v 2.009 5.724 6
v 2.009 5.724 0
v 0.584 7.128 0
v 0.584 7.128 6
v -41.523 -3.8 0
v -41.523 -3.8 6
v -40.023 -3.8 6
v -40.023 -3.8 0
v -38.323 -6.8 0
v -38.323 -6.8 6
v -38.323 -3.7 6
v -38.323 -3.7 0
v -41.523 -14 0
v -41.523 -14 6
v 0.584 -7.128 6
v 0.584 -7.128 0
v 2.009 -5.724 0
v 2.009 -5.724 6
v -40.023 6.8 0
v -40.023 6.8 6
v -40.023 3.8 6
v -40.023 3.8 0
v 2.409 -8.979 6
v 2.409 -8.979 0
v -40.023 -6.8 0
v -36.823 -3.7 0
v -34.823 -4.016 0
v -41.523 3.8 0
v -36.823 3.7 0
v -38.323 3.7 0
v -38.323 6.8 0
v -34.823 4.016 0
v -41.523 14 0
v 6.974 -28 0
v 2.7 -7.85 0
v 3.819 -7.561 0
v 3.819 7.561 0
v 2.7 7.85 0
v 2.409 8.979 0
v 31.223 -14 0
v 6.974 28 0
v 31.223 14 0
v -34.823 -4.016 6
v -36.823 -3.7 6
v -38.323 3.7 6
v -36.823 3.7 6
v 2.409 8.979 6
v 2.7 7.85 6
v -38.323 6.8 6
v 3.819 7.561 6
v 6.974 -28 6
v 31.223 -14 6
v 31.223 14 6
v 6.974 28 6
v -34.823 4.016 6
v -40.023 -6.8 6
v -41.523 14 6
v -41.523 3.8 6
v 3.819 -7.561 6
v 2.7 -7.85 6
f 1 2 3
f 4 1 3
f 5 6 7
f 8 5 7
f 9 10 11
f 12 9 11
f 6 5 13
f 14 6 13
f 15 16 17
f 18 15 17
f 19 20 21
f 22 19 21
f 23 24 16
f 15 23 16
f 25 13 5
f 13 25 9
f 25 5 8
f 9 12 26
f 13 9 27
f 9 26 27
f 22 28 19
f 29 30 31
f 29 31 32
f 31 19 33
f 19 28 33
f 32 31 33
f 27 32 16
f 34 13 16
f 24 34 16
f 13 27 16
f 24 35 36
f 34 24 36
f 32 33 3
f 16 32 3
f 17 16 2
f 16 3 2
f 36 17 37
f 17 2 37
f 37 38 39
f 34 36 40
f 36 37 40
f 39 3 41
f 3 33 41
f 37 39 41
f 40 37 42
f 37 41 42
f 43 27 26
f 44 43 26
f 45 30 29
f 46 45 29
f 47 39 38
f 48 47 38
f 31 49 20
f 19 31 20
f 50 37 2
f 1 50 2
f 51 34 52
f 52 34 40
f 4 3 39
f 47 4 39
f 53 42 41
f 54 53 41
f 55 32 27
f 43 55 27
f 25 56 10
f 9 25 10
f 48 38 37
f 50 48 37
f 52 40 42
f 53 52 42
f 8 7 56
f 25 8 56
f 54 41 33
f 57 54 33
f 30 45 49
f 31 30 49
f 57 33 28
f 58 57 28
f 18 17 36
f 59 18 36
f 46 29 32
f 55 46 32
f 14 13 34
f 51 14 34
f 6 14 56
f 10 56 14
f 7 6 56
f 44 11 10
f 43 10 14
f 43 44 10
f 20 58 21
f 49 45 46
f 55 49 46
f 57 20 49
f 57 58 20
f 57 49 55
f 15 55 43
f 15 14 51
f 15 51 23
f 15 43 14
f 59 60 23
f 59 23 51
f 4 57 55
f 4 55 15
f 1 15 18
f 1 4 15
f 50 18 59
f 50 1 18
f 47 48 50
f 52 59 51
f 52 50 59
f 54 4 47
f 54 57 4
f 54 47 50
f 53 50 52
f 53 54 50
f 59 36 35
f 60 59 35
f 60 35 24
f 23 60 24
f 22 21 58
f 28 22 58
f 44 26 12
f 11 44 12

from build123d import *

# Parameters (mm, degrees)
BOSS_EXTRUDE1_DEPTH = 6
CUT_EXTRUDE1_DEPTH  = 51.439717383


with BuildPart() as part:
    # Sketch1 → Boss-Extrude1 (new body)
    # profile 1 of 2: a face of its own
    with BuildSketch(Plane.XY):
        Polygon((31.223066959, -14), (31.223066959, 0), (-34.823066959, 0), (-34.823066959, -4.01574156), (-36.823066959, -3.7), (-41.523066959, -3.7), (-41.523066959, -14), (6.974355653, -28), align=None)
        Polygon((2.700425446, -7.850425446), (2.408714576, -8.979109263), (0.584447895, -7.127556852), (2.009048725, -5.723949904), (3.819278422, -7.561255379), align=None, mode=Mode.SUBTRACT)
    # profile 2 of 2: a face of its own
    with BuildSketch(Plane.XY):
        Polygon((31.223066959, 0), (31.223066959, 14), (6.974355653, 28), (-41.523066959, 14), (-41.523066959, 3.7), (-36.823066959, 3.7), (-34.823066959, 4.01574156), (-34.823066959, 0), align=None)
        Polygon((2.408714576, 8.979109263), (2.700425446, 7.850425446), (3.819278422, 7.561255379), (2.009048725, 5.723949904), (0.584447895, 7.127556852), align=None, mode=Mode.SUBTRACT)
    extrude(amount=BOSS_EXTRUDE1_DEPTH)

    # Sketch2 → Cut-Extrude1 (cut, through all)
    with BuildSketch(Plane.XY.offset(6)):
        Polygon((-41.623066959, -3.427539205), (-41.623066959, -3.8), (-40.023066959, -3.8), (-40.023066959, -6.8), (-38.323066959, -6.8), (-38.323066959, 6.8), (-40.023066959, 6.8), (-40.023066959, 3.8), (-41.623066959, 3.8), (-41.623066959, 3.427539205), align=None)
    extrude(amount=-CUT_EXTRUDE1_DEPTH, mode=Mode.SUBTRACT)


solid = part.part
